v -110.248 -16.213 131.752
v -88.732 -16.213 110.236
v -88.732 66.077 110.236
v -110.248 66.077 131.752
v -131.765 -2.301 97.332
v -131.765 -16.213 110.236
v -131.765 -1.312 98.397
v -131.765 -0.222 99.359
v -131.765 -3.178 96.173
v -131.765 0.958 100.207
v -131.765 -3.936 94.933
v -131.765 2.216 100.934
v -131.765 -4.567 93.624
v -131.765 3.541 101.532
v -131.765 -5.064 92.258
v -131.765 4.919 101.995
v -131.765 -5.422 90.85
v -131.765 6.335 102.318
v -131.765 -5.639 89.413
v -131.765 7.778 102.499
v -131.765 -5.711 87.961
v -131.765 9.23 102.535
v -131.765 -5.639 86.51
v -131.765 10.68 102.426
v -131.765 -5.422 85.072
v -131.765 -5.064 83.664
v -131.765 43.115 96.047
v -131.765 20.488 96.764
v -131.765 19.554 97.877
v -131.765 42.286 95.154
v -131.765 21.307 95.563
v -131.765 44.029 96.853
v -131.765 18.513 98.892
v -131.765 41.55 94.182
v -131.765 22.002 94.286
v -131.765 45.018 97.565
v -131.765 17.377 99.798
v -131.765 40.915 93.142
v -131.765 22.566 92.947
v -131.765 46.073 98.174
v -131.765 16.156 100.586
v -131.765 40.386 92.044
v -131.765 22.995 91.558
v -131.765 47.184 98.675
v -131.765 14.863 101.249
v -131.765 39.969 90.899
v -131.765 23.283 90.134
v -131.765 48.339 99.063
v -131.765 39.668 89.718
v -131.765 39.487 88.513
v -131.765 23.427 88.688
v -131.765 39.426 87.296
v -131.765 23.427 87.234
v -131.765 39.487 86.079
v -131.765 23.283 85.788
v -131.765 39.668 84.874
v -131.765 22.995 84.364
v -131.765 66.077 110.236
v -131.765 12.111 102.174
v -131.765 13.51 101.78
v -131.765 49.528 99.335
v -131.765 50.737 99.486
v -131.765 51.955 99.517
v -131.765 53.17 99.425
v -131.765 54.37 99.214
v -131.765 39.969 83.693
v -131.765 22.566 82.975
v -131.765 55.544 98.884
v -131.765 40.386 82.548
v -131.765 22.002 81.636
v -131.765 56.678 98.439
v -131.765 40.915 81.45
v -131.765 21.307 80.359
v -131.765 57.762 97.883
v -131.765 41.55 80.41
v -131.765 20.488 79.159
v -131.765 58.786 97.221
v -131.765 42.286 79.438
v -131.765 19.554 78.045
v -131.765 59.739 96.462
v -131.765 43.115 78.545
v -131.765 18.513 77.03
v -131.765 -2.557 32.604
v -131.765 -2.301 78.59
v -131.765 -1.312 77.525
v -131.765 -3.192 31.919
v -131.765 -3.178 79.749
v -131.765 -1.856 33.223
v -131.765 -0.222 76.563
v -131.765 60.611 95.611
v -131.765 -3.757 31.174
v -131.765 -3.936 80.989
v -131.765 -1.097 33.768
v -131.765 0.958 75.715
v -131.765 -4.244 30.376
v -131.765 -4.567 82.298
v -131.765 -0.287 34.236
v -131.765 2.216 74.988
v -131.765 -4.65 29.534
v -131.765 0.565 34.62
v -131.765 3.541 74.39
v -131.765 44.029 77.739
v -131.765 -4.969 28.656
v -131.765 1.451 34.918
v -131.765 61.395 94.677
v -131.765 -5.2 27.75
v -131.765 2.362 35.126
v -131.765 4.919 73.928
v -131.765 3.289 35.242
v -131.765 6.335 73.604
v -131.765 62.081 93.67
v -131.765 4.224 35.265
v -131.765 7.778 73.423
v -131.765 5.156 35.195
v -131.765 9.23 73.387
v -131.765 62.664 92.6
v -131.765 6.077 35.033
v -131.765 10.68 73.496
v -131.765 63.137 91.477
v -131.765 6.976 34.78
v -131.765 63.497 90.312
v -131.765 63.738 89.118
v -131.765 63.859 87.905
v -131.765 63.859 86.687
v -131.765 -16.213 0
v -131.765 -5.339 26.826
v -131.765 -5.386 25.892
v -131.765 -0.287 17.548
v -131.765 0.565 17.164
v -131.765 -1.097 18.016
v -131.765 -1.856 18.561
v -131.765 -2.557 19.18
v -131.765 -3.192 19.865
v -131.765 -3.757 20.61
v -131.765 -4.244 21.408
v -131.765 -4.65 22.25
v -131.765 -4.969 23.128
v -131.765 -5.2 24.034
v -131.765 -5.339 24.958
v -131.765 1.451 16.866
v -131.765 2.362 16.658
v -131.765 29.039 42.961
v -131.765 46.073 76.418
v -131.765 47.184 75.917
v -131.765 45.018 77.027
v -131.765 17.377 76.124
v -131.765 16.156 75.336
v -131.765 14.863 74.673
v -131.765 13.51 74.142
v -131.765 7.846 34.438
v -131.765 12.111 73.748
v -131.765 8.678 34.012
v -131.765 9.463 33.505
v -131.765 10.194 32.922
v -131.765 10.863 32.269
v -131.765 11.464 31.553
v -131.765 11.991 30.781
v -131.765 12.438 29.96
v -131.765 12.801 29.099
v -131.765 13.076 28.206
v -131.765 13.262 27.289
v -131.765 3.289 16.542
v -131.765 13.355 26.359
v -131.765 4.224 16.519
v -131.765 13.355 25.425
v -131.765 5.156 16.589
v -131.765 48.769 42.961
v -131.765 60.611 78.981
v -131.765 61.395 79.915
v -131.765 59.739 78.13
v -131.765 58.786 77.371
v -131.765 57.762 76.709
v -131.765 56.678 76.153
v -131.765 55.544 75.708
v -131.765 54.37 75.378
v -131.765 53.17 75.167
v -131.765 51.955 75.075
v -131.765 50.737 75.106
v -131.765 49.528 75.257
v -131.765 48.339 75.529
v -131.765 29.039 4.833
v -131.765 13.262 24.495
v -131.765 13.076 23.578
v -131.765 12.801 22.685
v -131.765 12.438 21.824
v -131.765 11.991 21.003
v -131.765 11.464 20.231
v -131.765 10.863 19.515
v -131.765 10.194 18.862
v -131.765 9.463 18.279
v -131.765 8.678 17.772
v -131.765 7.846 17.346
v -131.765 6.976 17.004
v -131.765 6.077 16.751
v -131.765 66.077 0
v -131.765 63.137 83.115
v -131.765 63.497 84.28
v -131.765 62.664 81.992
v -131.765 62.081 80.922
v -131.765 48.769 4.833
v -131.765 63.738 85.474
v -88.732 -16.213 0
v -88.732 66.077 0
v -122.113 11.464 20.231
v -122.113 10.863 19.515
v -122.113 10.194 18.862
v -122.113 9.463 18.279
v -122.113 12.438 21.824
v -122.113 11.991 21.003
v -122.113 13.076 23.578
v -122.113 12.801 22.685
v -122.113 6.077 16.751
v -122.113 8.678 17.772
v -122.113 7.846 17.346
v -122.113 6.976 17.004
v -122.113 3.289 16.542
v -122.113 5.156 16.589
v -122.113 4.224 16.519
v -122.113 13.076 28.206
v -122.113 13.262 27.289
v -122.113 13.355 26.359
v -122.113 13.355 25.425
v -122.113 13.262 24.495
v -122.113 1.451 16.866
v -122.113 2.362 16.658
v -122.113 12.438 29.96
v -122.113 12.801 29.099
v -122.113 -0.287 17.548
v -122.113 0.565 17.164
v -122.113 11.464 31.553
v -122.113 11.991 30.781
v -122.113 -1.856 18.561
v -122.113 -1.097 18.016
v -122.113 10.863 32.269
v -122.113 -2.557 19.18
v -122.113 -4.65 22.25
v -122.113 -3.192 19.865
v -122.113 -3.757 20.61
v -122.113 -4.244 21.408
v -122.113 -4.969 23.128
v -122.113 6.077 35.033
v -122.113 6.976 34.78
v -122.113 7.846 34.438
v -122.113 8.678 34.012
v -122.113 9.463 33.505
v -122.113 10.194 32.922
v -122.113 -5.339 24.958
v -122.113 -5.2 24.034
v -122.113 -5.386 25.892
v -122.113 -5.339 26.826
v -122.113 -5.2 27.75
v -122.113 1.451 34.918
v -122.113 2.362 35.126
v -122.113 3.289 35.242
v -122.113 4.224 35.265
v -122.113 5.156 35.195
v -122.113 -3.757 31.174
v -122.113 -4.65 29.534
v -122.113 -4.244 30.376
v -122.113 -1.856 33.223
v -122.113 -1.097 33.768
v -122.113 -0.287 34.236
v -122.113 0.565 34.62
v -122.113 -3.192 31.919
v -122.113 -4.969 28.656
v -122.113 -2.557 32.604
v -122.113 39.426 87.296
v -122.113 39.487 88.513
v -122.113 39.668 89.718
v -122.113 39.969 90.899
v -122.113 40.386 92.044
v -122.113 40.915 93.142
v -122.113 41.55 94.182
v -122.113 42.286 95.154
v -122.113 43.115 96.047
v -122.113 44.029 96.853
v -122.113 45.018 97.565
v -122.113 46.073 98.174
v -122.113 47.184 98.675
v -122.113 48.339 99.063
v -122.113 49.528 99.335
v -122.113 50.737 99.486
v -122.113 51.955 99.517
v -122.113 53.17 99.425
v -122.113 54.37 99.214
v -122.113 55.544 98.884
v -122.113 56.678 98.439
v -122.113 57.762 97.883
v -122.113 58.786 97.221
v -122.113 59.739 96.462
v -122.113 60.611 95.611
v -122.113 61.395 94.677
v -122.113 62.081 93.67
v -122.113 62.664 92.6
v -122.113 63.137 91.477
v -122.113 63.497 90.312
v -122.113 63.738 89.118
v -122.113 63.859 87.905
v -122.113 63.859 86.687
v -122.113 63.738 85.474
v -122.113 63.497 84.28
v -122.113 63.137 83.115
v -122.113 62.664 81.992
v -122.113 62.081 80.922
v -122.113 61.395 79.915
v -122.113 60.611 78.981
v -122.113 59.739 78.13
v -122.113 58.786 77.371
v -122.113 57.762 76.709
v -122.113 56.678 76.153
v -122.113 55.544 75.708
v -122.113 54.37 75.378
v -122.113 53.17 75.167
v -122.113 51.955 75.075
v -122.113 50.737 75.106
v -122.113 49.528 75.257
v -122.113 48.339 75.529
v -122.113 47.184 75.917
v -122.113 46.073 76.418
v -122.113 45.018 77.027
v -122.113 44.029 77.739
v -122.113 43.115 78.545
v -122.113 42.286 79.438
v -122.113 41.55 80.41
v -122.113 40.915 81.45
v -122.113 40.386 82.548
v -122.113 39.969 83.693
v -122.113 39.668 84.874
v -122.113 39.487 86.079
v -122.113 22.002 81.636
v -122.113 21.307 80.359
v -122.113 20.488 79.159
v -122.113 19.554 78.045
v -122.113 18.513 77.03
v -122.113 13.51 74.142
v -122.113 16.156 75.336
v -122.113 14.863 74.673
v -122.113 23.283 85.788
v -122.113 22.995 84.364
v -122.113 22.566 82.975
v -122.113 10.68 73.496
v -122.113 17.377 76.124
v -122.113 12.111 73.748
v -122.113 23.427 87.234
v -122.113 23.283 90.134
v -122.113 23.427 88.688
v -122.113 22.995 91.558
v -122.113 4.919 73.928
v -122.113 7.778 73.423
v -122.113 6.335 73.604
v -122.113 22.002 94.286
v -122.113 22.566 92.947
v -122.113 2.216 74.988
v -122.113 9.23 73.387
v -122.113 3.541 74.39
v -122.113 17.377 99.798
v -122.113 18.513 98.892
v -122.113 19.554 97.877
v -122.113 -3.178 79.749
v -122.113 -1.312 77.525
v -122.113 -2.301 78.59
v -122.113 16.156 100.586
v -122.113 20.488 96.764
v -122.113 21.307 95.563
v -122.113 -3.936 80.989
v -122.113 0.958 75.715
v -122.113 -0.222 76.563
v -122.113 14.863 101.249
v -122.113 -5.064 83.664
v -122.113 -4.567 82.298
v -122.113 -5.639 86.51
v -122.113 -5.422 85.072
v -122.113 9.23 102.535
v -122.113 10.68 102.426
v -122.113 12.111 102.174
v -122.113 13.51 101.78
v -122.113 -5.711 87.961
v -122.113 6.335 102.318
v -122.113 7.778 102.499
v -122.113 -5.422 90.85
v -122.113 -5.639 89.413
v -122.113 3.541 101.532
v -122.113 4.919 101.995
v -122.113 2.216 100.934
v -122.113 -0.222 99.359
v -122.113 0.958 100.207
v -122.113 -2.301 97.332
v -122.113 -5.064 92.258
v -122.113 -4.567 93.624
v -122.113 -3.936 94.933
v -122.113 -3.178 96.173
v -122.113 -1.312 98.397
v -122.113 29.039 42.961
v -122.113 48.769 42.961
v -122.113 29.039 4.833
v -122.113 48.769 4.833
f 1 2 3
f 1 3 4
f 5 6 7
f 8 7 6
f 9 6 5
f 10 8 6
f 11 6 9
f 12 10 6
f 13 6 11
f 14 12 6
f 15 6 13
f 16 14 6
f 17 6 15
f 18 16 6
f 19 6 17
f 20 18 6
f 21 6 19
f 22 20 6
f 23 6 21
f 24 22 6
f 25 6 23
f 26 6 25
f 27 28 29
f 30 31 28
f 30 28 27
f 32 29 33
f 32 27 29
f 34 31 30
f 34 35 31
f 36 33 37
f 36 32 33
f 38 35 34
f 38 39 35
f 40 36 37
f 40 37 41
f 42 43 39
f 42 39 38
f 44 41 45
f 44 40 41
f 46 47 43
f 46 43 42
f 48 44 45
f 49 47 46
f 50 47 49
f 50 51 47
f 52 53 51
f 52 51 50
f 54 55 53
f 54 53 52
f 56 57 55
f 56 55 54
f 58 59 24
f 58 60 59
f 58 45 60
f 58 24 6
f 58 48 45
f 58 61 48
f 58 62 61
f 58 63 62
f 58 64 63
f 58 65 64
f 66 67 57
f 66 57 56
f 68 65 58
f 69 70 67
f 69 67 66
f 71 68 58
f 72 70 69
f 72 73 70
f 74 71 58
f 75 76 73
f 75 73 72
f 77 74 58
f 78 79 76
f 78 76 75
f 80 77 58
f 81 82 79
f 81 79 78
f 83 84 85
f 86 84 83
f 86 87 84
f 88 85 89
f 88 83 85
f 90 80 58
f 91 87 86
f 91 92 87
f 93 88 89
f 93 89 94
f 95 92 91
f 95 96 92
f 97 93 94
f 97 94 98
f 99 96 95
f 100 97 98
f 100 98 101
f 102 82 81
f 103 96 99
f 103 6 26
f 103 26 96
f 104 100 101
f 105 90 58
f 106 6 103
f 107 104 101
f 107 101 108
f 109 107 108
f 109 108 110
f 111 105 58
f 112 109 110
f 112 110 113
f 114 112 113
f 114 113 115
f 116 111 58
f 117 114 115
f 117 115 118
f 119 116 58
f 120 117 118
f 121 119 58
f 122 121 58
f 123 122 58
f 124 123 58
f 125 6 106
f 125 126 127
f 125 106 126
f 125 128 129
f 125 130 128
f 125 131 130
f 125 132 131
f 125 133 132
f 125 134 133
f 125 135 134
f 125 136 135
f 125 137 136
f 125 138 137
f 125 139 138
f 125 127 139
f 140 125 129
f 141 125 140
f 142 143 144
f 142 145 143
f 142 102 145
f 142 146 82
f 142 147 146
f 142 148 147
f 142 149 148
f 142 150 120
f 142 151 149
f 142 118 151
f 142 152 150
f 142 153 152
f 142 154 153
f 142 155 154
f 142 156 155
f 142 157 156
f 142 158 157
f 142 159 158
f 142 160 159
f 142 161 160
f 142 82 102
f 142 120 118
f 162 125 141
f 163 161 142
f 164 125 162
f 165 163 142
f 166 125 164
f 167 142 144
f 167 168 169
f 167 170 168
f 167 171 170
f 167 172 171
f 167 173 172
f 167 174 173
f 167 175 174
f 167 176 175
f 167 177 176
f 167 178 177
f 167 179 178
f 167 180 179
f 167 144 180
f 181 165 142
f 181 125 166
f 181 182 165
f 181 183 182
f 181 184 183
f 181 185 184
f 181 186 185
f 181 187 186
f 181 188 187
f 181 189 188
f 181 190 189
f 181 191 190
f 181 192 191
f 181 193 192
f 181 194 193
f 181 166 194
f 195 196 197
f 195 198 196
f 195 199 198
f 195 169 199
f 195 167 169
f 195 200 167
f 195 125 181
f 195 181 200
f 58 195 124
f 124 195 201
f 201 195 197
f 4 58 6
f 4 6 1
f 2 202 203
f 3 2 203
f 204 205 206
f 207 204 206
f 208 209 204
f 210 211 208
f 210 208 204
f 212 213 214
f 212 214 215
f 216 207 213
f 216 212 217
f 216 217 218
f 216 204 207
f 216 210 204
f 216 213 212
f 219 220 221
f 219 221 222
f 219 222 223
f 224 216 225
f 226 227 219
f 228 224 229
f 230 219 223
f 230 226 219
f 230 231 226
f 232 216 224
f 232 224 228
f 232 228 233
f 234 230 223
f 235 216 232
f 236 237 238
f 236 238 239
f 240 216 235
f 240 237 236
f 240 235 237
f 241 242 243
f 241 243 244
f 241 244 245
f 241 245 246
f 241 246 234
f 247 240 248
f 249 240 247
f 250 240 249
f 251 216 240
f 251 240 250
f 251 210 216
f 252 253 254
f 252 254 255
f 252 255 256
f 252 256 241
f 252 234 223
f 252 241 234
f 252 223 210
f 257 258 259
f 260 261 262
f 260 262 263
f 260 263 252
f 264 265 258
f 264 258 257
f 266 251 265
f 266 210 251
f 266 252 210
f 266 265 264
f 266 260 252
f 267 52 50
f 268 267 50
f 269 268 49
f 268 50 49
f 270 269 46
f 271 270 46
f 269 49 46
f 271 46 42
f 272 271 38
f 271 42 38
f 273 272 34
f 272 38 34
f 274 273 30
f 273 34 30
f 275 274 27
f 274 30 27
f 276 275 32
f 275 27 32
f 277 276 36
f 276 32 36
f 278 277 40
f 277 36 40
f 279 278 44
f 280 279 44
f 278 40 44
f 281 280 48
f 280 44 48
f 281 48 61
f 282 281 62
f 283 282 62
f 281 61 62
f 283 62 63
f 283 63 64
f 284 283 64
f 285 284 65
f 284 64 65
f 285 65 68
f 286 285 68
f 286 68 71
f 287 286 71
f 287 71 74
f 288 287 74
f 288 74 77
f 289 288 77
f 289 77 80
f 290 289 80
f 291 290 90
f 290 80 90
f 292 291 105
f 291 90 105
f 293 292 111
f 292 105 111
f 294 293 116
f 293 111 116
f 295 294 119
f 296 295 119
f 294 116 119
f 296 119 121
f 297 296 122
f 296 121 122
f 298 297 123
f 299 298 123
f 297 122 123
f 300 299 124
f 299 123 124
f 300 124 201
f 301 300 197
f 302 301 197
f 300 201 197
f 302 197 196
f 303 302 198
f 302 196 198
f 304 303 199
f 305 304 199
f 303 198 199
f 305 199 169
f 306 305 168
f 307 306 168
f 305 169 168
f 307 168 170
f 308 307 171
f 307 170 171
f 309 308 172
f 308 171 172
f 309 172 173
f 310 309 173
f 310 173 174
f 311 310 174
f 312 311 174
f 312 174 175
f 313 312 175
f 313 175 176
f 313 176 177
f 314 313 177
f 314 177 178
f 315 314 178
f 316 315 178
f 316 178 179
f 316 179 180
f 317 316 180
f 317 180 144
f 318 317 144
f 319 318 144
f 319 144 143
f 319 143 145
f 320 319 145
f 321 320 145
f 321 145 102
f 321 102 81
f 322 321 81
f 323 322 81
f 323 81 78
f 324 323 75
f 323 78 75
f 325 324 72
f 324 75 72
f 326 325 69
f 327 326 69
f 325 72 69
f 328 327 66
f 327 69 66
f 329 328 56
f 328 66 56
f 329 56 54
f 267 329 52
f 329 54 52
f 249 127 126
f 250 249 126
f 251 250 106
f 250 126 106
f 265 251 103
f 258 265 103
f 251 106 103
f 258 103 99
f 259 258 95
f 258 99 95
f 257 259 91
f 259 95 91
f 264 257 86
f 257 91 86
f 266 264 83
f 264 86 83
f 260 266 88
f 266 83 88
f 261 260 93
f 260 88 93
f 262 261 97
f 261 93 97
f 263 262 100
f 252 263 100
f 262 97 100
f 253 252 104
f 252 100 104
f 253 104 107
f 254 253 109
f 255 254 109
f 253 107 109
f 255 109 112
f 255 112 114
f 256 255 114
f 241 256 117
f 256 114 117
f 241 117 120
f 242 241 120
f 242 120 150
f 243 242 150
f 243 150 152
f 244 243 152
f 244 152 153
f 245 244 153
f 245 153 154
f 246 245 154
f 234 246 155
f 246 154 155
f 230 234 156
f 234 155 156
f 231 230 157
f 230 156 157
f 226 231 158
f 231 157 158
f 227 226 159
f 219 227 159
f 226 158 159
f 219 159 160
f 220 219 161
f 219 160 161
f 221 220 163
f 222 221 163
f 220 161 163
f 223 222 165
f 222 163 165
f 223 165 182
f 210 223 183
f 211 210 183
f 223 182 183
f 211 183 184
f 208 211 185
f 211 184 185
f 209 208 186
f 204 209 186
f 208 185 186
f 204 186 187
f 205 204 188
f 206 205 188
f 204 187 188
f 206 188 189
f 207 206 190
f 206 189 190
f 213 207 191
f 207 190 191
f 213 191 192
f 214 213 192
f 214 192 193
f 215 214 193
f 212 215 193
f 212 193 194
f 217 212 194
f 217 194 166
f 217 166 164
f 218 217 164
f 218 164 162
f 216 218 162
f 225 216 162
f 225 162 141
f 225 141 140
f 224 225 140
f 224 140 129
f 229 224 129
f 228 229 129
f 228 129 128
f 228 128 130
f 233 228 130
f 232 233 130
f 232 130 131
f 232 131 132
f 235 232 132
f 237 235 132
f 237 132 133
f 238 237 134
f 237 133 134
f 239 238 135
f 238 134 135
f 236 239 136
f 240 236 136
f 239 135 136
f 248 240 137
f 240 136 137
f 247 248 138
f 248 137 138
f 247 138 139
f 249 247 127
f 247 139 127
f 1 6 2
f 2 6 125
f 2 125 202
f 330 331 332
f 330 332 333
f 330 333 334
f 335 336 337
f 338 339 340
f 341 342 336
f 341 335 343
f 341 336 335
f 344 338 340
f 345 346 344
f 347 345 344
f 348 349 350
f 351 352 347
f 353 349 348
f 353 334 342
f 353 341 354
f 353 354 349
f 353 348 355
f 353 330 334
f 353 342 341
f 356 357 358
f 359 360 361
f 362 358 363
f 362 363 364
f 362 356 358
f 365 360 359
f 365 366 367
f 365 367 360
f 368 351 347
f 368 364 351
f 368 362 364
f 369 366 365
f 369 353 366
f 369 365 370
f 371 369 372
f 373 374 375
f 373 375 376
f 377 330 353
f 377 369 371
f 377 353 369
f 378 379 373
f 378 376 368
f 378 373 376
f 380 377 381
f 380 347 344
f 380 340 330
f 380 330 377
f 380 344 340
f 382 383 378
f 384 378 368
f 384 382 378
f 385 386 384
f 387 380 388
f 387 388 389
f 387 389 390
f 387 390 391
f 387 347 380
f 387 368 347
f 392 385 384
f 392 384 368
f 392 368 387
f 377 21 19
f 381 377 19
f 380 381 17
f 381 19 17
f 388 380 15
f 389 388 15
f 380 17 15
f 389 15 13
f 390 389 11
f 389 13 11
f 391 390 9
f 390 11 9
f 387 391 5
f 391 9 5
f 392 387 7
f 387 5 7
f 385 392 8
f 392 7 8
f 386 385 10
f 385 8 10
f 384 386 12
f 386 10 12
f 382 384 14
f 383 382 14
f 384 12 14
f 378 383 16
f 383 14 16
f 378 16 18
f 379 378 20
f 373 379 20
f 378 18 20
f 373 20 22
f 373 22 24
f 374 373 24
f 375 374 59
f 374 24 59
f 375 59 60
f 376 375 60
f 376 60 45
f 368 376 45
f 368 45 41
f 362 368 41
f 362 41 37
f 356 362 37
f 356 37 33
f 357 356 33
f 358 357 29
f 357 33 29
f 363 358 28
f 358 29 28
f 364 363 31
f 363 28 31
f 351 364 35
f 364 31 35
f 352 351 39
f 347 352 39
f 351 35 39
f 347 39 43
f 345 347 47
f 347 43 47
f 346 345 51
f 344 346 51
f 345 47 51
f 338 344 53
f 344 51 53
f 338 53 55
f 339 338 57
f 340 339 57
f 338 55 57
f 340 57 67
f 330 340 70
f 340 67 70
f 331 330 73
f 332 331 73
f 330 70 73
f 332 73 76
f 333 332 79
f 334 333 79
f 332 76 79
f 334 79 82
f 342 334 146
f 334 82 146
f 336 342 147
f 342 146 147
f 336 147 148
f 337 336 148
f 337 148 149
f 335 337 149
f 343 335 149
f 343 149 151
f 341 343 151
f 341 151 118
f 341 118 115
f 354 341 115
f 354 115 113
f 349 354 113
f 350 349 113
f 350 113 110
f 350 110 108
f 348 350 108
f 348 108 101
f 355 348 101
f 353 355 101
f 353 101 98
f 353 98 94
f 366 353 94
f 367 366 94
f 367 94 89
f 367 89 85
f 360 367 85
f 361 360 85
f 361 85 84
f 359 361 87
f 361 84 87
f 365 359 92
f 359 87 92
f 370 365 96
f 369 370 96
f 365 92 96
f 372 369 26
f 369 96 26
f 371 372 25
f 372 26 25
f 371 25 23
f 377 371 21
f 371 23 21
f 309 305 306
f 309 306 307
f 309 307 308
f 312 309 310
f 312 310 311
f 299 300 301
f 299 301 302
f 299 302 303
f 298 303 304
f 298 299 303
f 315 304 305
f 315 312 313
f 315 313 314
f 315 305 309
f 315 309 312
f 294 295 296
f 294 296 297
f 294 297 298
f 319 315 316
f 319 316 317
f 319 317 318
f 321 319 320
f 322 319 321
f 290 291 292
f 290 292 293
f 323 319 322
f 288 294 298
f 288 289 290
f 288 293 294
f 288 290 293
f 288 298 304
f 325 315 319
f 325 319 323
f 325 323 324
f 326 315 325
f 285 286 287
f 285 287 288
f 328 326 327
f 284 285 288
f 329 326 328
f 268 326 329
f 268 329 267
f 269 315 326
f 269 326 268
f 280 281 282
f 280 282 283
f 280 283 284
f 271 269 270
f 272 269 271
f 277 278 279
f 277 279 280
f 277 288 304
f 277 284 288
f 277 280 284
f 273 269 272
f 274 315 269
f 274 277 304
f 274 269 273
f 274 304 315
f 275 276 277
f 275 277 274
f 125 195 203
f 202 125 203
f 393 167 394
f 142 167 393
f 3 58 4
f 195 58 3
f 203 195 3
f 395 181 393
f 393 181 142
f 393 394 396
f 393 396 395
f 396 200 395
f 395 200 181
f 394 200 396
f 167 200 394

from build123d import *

# Parameters (mm, degrees)
F0_W        = 43.0329442024
F0_H        = 82.2901595384
F1_DEPTH    = 135.636
F2_T1_DEPTH = 212.9316553271
F3_W        = 19.7290945798
F3_H        = 38.1281389855
F3_R        = 12.2243381544
F3_R_2      = 14.5784118216
F3_R_3      = 9.3761022788
F4_DEPTH    = 9.652


# Not quite as in the source:
# - a fillet or chamfer that OpenCascade refuses, or shapes differently, is made with other operations: its cross-section is extruded or revolved along the edge and cut away or added


with BuildPart() as f1:
    # F0 (on Top) → F1 (new body)
    with BuildSketch(Plane.XY):
        with Locations((-110.2483123541, 24.9322196469)):
            Rectangle(F0_W, F0_H)
    extrude(amount=F1_DEPTH)

    # F2: chamfer of 25.4 on 2 edges, made by hand

    # F2_s2 → F2_t1 (cut)
    with BuildSketch(Plane.XZ.offset(-131.3980473104)):
        Polygon((-131.7647844553, 110.236), (-106.3647844553, 135.636), (-131.7647844553, 135.636), align=None)
        Polygon((-88.7318402529, 110.236), (-114.1318402529, 135.636), (-88.7318402529, 135.636), align=None)
    extrude(amount=F2_T1_DEPTH, mode=Mode.SUBTRACT)

    # F3 (on face) → F4 (cut)
    with BuildSketch(Plane(origin=(-131.7647844553, 0, 0), x_dir=(0, -1, 0), z_dir=(-1, 0, 0))):
        with Locations((-38.9040028676, 23.8969207276)):
            Rectangle(F3_W, F3_H)
        with Locations((-51.650326699, 87.2960314155)):
            Circle(F3_R)
        with Locations((-8.8670095429, 87.961062789)):
            Circle(F3_R_2)
        with Locations((-3.9901542477, 25.8919987828)):
            Circle(F3_R_3)
    extrude(amount=-F4_DEPTH, mode=Mode.SUBTRACT)


solid = f1.part
